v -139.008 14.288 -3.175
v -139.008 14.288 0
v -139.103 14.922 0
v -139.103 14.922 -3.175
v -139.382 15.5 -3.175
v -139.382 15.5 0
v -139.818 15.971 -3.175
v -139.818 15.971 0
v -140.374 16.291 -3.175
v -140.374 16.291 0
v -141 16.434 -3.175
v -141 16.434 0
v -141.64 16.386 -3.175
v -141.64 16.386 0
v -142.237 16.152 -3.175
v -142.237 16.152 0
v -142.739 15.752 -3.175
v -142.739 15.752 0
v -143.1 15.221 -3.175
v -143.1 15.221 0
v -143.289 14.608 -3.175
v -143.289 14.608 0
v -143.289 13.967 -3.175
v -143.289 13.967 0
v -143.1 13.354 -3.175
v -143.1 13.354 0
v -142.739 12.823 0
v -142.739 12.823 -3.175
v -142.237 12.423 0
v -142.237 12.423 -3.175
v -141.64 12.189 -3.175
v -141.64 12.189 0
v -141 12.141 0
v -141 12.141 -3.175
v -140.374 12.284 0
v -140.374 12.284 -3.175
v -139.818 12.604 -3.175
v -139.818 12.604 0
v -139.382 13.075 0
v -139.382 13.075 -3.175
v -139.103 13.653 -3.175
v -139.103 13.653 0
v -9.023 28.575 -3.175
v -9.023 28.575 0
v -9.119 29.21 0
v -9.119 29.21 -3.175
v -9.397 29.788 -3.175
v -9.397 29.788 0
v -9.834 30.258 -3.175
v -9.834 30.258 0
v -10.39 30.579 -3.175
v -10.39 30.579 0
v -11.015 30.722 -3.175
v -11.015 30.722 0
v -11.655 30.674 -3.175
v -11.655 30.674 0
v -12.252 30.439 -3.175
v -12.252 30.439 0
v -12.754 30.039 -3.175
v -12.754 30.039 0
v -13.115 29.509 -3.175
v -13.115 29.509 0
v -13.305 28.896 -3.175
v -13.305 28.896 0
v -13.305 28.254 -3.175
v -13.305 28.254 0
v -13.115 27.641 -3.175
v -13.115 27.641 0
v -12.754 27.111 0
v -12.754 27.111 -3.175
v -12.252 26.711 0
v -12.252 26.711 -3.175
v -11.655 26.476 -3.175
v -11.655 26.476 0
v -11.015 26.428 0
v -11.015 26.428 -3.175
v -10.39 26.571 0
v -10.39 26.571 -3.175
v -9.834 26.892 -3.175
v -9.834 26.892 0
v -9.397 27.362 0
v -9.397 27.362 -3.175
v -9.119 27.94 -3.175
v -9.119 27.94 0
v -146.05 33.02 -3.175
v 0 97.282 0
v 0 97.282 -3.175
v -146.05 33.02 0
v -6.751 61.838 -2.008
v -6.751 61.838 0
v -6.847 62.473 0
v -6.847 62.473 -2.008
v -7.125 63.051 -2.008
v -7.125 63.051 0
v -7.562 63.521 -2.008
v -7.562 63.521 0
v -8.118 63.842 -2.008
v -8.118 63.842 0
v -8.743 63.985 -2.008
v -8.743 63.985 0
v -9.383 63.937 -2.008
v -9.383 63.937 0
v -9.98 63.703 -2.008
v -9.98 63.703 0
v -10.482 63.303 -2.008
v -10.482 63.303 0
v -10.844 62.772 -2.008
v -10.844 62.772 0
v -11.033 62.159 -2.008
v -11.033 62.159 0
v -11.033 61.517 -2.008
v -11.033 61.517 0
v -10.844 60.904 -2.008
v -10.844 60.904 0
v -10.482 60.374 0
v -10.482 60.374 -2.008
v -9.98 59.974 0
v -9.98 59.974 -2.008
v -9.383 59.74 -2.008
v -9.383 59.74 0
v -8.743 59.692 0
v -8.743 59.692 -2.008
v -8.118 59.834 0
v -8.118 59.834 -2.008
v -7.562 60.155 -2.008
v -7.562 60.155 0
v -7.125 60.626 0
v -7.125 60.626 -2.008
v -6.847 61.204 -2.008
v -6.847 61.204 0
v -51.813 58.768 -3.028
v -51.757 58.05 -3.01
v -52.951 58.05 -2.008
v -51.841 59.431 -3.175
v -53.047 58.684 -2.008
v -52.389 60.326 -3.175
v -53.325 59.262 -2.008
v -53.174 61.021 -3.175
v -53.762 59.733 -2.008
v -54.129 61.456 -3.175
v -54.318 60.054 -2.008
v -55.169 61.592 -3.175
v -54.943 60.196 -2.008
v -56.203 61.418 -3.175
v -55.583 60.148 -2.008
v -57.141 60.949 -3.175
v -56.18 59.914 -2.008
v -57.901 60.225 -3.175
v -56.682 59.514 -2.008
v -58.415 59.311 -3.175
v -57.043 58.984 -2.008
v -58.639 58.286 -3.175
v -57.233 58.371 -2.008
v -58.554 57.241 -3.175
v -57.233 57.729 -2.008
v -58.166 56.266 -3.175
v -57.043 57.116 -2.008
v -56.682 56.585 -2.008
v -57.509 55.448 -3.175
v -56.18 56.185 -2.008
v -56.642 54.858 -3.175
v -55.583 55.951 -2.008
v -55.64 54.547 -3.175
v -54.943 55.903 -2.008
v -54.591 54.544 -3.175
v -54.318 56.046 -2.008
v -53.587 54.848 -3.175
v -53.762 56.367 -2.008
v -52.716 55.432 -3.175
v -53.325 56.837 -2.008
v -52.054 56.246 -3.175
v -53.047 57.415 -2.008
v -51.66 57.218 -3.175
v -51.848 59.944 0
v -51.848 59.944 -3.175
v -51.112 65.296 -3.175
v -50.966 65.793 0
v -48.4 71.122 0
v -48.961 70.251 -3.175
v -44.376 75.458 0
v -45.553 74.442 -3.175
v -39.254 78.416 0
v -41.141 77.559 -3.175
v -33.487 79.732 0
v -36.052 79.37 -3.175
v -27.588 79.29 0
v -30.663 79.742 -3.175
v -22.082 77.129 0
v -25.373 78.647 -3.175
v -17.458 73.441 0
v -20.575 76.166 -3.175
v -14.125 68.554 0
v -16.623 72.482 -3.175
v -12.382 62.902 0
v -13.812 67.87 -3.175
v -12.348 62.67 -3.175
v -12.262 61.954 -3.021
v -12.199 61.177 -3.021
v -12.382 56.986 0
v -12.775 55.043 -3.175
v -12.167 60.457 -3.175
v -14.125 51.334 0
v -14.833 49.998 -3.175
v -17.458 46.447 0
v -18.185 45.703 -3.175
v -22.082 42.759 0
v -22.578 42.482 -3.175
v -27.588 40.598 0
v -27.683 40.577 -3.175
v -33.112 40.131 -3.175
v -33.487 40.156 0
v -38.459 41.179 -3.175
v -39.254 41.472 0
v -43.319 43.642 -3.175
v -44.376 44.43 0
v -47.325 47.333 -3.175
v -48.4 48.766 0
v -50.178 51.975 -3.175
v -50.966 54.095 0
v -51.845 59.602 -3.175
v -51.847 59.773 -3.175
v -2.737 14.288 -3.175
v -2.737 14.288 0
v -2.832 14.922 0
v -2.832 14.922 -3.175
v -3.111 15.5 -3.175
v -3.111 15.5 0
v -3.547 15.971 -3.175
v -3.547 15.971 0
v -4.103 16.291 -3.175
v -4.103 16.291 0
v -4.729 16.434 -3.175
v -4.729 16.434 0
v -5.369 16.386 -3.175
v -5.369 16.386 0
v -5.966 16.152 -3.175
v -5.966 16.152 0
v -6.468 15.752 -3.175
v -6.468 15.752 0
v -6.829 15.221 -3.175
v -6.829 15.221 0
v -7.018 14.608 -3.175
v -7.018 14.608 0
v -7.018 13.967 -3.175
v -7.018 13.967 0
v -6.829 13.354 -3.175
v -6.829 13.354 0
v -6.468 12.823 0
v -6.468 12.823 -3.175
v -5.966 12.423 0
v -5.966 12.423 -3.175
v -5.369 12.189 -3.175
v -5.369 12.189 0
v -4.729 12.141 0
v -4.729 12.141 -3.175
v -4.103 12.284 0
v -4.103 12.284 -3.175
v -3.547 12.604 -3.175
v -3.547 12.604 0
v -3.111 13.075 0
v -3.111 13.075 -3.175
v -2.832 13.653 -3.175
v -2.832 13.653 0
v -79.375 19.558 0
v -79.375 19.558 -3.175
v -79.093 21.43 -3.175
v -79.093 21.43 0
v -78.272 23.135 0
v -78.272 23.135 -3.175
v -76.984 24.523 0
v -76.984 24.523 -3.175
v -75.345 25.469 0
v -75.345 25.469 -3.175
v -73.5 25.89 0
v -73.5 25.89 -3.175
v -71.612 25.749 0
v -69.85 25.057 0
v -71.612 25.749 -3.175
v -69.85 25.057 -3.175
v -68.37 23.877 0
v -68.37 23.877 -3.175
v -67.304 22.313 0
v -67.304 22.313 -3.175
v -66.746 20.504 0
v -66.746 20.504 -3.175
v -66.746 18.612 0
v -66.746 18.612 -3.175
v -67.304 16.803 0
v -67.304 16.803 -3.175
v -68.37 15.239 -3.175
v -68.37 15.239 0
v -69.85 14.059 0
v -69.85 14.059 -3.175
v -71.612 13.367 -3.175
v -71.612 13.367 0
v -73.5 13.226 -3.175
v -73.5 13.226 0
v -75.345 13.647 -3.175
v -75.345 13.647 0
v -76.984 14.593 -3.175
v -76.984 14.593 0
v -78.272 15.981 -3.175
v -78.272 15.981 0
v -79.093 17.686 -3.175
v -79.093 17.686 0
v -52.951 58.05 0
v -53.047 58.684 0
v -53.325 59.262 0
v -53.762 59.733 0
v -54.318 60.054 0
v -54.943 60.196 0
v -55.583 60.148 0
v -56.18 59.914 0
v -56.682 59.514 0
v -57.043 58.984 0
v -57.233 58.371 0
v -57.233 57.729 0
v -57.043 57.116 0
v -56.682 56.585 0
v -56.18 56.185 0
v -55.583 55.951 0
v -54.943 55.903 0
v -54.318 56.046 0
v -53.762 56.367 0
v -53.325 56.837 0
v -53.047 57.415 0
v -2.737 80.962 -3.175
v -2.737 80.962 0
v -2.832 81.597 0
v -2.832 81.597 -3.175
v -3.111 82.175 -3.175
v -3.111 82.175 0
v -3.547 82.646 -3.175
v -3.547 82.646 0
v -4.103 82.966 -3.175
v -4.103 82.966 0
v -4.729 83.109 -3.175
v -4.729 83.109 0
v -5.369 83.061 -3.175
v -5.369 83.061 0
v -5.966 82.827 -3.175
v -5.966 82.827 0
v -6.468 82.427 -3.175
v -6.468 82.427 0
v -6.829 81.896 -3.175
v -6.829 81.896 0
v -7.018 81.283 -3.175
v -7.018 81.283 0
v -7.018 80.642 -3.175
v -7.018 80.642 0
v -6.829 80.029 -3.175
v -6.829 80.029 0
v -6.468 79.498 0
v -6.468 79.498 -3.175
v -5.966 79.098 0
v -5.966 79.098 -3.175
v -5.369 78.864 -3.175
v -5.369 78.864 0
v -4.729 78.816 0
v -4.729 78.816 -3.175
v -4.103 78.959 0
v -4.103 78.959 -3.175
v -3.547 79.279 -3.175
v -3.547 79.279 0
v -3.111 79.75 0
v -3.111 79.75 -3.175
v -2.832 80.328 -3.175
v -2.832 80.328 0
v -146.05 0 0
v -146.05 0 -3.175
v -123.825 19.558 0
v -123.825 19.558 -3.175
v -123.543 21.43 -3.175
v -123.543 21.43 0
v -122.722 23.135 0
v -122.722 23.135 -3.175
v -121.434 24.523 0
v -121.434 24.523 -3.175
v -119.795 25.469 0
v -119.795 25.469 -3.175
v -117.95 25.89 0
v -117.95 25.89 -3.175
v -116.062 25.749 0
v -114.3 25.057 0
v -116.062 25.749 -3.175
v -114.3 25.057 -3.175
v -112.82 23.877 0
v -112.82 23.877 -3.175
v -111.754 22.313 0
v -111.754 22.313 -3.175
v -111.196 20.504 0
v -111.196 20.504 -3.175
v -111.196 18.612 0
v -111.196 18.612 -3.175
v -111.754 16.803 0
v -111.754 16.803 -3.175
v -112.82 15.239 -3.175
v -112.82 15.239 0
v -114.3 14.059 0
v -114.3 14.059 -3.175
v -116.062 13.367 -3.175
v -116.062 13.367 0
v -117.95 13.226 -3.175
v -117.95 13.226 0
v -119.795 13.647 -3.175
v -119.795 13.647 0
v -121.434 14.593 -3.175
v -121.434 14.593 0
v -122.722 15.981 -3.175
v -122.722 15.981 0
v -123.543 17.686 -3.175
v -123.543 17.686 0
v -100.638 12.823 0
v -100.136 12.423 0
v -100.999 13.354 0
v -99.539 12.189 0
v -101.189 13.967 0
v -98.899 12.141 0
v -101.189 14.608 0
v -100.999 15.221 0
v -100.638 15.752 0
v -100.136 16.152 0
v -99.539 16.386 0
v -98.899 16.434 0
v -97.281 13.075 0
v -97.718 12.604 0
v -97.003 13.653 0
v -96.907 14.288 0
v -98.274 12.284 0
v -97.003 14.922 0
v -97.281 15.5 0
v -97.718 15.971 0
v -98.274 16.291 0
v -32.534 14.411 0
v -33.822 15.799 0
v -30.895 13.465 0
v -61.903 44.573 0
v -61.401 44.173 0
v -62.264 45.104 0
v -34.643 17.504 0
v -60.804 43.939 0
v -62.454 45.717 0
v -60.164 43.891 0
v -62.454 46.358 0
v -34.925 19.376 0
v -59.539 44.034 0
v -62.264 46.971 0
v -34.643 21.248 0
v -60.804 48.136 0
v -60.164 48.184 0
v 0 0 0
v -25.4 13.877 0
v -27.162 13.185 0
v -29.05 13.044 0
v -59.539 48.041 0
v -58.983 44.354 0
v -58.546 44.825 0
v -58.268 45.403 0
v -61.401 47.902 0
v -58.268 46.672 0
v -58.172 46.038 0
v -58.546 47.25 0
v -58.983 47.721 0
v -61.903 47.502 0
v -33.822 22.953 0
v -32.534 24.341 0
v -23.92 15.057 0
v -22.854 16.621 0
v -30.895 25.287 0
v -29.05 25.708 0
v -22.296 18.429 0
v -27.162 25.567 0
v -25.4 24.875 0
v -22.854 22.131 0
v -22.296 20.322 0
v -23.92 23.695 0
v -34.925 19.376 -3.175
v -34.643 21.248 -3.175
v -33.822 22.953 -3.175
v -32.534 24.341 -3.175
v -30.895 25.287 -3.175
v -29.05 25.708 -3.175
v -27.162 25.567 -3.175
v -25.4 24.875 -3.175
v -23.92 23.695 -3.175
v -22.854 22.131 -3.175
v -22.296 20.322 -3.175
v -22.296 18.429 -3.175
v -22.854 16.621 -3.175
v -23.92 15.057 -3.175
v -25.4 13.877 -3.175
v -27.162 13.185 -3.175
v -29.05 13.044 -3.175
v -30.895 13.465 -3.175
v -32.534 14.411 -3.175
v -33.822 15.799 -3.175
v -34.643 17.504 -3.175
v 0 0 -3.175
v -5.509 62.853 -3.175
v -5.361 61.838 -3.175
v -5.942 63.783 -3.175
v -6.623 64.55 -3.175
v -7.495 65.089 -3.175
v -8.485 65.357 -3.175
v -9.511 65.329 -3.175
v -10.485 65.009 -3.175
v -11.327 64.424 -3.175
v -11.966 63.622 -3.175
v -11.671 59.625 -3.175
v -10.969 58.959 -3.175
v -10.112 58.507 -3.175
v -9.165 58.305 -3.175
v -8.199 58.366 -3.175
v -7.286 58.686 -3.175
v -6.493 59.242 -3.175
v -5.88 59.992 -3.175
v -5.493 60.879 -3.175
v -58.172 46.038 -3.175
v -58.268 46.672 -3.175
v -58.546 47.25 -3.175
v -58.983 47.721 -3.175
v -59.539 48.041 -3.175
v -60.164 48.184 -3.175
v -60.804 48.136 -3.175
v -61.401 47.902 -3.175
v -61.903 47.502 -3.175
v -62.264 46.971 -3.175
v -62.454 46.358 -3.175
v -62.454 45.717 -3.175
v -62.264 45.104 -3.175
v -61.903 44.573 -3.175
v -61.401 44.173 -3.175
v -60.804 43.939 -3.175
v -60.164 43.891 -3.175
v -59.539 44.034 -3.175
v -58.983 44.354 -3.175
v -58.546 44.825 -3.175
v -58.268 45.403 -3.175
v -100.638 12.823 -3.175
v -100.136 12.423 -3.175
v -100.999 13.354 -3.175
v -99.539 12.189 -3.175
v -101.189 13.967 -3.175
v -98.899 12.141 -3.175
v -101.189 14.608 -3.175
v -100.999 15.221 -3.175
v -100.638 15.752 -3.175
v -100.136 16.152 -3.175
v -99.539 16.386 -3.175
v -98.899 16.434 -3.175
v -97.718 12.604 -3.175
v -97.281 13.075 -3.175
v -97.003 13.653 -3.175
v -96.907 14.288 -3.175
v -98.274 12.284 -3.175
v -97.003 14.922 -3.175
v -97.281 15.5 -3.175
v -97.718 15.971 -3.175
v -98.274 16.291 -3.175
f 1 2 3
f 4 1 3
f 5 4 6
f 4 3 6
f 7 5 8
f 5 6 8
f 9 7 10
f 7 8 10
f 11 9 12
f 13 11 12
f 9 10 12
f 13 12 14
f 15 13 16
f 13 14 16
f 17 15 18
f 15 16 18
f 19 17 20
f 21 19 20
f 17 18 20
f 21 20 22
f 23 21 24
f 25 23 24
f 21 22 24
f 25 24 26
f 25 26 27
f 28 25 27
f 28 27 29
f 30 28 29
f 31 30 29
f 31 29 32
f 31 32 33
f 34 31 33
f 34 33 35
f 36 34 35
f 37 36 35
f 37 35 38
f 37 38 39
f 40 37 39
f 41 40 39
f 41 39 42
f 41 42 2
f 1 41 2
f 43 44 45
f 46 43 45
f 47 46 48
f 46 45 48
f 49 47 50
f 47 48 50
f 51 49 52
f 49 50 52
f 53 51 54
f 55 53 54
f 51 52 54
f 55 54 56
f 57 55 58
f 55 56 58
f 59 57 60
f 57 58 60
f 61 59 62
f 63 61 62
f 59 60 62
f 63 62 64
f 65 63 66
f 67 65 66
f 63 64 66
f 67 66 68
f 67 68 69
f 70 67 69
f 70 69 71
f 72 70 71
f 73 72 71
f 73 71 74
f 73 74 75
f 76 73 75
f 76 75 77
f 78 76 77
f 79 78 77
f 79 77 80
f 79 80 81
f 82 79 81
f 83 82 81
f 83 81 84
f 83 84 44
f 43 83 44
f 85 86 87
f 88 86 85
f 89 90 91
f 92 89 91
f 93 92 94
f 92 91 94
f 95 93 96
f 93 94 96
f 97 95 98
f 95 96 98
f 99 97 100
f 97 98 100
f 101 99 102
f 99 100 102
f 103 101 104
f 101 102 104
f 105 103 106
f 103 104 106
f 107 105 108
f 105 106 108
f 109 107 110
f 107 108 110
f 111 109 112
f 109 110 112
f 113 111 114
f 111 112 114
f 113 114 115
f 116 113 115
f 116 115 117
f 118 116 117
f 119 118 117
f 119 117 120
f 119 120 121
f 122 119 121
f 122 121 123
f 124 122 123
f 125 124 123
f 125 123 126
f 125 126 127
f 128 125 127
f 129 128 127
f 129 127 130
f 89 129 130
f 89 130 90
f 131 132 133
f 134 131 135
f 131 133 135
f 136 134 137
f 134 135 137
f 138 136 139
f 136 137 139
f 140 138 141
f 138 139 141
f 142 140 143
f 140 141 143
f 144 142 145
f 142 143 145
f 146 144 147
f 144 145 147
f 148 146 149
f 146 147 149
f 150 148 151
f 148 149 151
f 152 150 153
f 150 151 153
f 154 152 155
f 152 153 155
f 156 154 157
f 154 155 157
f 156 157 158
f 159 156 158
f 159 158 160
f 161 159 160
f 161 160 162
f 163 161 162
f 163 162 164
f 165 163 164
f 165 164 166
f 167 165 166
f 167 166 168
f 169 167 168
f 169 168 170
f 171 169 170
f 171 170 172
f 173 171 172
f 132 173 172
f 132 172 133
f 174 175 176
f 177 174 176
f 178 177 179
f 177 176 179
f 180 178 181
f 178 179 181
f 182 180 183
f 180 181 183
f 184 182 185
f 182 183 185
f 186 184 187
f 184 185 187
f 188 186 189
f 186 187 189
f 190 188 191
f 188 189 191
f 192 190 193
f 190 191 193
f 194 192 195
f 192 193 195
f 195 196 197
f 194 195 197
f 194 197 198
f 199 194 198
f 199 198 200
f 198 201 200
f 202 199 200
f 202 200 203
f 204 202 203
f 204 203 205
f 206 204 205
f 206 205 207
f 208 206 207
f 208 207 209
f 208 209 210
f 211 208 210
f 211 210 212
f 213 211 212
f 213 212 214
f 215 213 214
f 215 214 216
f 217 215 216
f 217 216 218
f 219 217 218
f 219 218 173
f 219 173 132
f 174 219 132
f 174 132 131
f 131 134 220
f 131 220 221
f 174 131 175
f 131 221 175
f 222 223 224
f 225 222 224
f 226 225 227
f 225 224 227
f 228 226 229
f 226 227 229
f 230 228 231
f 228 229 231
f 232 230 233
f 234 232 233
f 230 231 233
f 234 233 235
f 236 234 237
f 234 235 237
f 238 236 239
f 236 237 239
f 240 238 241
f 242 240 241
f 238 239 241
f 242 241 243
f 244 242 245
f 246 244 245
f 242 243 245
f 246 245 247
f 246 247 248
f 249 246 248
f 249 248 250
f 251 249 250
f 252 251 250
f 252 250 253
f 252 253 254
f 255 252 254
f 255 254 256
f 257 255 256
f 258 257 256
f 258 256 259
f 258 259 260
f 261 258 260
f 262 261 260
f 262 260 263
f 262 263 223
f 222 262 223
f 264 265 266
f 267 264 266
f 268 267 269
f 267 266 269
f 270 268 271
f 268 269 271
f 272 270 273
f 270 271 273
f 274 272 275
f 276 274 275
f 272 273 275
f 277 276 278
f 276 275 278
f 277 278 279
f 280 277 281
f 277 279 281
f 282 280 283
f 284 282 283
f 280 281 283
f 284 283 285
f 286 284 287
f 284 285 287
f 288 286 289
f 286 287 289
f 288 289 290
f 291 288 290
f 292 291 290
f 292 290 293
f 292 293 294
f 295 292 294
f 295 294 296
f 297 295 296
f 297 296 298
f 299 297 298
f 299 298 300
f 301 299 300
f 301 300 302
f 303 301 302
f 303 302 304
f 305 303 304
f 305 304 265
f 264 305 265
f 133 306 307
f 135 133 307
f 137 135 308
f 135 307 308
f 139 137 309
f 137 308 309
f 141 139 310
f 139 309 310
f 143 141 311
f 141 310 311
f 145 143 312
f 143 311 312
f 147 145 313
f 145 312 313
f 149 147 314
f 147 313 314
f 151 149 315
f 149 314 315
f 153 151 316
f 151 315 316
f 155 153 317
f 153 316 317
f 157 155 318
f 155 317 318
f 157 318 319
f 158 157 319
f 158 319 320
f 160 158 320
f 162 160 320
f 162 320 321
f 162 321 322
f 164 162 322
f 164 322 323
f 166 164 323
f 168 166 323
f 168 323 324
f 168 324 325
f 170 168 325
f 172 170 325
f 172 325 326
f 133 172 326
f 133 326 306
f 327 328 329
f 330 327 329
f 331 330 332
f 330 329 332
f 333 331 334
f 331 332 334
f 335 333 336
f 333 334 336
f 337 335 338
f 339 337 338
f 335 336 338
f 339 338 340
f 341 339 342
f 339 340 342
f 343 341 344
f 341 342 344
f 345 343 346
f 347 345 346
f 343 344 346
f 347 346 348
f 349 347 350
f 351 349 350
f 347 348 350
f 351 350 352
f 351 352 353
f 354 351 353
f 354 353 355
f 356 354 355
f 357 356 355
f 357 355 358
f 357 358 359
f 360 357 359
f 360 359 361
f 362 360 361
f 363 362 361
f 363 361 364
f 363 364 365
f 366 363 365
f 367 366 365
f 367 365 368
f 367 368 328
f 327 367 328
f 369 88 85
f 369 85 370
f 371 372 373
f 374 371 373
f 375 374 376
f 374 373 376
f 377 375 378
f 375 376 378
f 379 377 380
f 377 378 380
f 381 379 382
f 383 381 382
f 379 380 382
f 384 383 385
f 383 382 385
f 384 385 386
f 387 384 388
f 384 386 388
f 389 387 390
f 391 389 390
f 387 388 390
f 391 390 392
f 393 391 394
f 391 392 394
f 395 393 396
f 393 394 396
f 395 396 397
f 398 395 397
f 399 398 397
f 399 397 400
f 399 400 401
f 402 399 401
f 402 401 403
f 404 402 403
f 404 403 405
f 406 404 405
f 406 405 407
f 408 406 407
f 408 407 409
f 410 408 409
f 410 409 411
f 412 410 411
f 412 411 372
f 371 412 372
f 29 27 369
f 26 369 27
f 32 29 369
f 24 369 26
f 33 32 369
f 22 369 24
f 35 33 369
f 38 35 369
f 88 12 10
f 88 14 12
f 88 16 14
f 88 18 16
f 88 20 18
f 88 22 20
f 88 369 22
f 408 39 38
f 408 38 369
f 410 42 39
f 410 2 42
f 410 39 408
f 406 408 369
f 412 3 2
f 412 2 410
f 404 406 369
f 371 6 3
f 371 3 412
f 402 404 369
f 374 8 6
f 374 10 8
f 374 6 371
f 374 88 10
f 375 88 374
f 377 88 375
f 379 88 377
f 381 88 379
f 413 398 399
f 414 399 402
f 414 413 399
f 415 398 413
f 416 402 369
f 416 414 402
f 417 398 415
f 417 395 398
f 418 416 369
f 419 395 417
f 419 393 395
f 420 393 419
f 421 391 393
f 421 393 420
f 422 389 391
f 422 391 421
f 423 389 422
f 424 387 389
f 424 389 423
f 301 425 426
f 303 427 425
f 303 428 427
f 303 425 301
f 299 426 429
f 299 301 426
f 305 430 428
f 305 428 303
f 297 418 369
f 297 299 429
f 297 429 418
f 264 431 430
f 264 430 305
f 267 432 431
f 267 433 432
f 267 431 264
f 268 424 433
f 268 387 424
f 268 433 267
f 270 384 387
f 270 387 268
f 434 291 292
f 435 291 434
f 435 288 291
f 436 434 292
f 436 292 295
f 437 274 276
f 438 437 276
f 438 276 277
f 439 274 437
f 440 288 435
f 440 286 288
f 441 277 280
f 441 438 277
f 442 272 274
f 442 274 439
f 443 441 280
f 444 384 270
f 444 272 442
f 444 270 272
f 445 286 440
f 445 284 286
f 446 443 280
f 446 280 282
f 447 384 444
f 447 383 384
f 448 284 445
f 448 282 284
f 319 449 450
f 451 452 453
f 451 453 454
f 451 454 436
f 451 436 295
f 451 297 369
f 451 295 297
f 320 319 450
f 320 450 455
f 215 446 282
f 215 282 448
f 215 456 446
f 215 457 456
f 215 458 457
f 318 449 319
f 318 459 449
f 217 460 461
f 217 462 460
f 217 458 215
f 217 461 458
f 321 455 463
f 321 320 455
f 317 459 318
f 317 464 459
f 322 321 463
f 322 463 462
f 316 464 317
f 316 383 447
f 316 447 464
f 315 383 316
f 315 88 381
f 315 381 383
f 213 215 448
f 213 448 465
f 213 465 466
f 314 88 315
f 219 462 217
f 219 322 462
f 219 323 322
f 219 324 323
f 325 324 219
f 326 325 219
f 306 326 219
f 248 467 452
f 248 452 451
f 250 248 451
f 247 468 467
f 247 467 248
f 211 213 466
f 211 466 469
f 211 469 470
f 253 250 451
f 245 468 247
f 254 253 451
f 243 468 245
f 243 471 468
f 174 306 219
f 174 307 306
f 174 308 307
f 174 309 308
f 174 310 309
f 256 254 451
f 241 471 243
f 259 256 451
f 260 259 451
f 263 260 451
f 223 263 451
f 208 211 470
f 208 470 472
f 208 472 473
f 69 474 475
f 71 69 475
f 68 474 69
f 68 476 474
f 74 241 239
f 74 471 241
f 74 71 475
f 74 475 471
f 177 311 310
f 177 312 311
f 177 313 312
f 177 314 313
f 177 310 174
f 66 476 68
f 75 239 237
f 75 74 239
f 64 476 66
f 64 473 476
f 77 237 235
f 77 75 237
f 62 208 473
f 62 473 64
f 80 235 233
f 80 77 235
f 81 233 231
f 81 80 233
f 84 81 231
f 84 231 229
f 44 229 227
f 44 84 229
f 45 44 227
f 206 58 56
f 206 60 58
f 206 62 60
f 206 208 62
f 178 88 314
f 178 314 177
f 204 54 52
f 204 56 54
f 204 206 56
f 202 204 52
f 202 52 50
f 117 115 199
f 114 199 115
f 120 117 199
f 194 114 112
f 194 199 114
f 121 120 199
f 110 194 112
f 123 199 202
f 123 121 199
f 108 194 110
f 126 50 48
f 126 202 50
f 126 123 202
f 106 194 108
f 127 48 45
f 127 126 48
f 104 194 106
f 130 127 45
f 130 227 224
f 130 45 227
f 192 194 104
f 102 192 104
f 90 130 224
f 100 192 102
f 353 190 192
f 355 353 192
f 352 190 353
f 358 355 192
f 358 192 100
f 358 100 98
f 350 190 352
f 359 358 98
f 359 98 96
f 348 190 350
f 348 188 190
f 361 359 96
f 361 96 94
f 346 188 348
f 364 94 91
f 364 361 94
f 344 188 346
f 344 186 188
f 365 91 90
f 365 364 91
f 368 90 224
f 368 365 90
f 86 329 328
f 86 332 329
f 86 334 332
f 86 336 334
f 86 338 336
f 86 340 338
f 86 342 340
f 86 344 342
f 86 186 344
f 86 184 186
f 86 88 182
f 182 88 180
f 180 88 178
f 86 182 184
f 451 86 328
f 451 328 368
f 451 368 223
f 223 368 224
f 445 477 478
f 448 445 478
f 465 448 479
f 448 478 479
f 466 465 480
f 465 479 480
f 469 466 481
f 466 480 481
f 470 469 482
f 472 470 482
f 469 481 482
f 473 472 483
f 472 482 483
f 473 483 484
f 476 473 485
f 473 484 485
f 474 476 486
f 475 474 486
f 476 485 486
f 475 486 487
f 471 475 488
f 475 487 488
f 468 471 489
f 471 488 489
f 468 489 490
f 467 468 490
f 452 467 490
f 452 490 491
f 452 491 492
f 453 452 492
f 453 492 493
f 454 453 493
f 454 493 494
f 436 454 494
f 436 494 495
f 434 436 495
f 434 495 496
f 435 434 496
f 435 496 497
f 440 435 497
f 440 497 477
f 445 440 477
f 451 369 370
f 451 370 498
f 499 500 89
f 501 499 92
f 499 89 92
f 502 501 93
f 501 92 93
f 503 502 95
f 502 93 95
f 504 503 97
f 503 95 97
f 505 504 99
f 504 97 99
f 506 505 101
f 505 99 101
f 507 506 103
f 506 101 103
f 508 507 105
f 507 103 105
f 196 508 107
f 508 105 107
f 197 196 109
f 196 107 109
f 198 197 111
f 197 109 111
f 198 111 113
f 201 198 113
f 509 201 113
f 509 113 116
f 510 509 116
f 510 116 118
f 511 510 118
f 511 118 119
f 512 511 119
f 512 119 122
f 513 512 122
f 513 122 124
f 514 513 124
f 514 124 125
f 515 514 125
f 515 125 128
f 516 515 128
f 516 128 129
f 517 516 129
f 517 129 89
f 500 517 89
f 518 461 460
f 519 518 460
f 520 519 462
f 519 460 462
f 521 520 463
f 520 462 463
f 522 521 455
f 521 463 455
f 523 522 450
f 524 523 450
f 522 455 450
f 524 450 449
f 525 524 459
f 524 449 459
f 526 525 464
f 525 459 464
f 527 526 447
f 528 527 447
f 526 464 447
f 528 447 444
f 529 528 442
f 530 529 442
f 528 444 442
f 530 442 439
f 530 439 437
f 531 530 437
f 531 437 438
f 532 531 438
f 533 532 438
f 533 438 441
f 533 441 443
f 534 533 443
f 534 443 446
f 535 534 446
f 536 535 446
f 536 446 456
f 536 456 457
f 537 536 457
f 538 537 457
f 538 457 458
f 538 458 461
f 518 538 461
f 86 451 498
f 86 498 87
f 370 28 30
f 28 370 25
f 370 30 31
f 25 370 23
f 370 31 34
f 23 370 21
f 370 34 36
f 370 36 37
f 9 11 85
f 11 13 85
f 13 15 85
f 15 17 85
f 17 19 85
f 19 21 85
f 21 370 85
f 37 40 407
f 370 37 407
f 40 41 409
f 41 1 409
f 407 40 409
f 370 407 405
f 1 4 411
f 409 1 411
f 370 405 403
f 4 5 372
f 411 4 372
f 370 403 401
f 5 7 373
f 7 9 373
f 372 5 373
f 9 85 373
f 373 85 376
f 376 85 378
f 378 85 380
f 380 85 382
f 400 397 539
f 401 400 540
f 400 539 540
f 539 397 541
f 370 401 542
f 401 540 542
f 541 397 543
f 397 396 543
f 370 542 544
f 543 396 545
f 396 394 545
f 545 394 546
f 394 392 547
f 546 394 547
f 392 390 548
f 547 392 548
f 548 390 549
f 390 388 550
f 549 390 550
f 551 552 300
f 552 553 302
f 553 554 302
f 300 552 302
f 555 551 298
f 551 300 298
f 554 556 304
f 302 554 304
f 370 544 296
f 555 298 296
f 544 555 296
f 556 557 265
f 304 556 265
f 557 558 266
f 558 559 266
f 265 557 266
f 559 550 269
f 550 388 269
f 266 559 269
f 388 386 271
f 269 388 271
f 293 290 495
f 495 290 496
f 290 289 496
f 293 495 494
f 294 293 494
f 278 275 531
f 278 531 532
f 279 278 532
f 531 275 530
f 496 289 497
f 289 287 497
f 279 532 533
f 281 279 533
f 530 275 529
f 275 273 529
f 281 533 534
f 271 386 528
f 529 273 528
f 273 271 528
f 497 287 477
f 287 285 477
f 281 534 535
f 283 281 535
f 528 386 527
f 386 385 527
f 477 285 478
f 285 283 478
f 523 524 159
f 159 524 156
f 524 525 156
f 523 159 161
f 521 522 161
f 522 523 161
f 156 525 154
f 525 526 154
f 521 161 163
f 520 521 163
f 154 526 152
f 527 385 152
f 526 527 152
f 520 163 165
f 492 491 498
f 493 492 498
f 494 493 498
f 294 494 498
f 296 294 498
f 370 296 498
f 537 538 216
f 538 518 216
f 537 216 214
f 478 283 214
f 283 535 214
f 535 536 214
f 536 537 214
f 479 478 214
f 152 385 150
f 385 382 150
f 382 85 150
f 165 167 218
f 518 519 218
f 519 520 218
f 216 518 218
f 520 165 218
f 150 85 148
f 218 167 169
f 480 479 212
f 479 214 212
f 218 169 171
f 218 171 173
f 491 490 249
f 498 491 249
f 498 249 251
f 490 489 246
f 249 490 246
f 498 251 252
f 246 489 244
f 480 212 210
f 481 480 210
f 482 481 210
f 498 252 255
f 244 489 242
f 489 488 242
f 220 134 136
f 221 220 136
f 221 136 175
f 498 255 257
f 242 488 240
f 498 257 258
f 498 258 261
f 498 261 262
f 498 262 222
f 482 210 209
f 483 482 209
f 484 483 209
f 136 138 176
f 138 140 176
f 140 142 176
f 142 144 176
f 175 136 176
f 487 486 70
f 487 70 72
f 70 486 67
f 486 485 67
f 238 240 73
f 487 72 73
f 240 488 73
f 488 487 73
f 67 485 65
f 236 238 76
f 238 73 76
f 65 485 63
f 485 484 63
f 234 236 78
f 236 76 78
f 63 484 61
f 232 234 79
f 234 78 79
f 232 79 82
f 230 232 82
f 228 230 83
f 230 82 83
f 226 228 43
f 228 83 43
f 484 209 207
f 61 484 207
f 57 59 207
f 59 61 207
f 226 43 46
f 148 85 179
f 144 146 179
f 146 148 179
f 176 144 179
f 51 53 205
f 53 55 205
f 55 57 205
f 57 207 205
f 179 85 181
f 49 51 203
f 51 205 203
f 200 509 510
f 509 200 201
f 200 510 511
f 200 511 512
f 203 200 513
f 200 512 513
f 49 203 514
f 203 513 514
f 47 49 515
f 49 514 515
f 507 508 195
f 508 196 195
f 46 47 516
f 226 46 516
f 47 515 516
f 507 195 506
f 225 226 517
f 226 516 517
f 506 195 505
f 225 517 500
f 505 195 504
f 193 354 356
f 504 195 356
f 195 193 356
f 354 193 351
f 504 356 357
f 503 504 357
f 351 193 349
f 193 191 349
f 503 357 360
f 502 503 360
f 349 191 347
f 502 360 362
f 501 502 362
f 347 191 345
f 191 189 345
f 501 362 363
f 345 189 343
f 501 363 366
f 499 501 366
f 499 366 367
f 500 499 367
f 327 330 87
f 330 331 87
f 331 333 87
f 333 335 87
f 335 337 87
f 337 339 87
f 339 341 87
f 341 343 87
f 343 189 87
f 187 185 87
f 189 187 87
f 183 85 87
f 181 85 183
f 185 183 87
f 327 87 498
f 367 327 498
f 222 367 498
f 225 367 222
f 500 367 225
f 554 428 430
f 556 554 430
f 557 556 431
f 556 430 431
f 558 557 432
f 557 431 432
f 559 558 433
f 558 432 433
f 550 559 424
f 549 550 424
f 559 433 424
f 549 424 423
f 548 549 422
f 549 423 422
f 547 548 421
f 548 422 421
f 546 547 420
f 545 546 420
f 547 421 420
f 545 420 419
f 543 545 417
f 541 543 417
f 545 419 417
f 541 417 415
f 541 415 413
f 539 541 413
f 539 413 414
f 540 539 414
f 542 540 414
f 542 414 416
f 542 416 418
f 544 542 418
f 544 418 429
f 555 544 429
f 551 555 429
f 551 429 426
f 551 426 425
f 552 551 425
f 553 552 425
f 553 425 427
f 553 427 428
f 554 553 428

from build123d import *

# Parameters (mm, degrees)
BOSS_EXTRUDE1_DEPTH                               = 3.175
F_6_CLEARANCE_HOLE1_D                             = 4.3053
SKETCH7_R                                         = 19.84375
SKETCH7_R_2                                       = 6.35
CUT_EXTRUDE1_DEPTH                                = 4.175
CSK_FOR_6_FLAT_HEAD_MACHINE_SCREW_100_D           = 4.3053
CSK_FOR_6_FLAT_HEAD_MACHINE_SCREW_100_DEPTH       = 3.175
CSK_FOR_6_FLAT_HEAD_MACHINE_SCREW_100_CSINK_D     = 7.0866
CSK_FOR_6_FLAT_HEAD_MACHINE_SCREW_100_CSINK_ANGLE = 100


with BuildPart() as part:
    # Sketch1 → Boss-Extrude1 (new body)
    with BuildSketch(Plane.XY):
        Polygon((0, 97.282), (-146.05, 33.02), (-146.05, 0), (0, 0), align=None)
    extrude(amount=-BOSS_EXTRUDE1_DEPTH)

    # #6 Clearance Hole1 (through all)
    with Locations(Plane(origin=(0, 0, -3.175), x_dir=(-1, 0, 0), z_dir=(0, 0, -1))):
        with Locations((4.8895, 80.9625), (4.8895, 14.2875), (141.1605, 14.2875), (11.176, 28.575), (60.325, 46.0375), (99.06, 14.2875)):
            Hole(F_6_CLEARANCE_HOLE1_D / 2)

    # Sketch7 → Cut-Extrude1 (cut, through all)
    with BuildSketch(Plane(origin=(0, 0, -3.175), x_dir=(-1, 0, 0), z_dir=(0, 0, -1))):
        with Locations((32.004, 59.944)):
            Circle(SKETCH7_R)
        with Locations((28.575, 19.375884027)):
            Circle(SKETCH7_R_2)
        with Locations((73.025, 19.558)):
            Circle(SKETCH7_R_2)
        with Locations((117.475, 19.558)):
            Circle(SKETCH7_R_2)
    extrude(amount=-CUT_EXTRUDE1_DEPTH, mode=Mode.SUBTRACT)

    # CSK for #6 Flat Head Machine Screw (100)1
    with Locations(Plane(origin=(0, 0, -3.175), x_dir=(-1, 0, 0), z_dir=(0, 0, -1))):
        with Locations((8.904042987, 61.838331605), (55.103957013, 58.049668395)):
            CounterSinkHole(CSK_FOR_6_FLAT_HEAD_MACHINE_SCREW_100_D / 2, CSK_FOR_6_FLAT_HEAD_MACHINE_SCREW_100_CSINK_D / 2, depth=CSK_FOR_6_FLAT_HEAD_MACHINE_SCREW_100_DEPTH, counter_sink_angle=CSK_FOR_6_FLAT_HEAD_MACHINE_SCREW_100_CSINK_ANGLE)


solid = part.part
